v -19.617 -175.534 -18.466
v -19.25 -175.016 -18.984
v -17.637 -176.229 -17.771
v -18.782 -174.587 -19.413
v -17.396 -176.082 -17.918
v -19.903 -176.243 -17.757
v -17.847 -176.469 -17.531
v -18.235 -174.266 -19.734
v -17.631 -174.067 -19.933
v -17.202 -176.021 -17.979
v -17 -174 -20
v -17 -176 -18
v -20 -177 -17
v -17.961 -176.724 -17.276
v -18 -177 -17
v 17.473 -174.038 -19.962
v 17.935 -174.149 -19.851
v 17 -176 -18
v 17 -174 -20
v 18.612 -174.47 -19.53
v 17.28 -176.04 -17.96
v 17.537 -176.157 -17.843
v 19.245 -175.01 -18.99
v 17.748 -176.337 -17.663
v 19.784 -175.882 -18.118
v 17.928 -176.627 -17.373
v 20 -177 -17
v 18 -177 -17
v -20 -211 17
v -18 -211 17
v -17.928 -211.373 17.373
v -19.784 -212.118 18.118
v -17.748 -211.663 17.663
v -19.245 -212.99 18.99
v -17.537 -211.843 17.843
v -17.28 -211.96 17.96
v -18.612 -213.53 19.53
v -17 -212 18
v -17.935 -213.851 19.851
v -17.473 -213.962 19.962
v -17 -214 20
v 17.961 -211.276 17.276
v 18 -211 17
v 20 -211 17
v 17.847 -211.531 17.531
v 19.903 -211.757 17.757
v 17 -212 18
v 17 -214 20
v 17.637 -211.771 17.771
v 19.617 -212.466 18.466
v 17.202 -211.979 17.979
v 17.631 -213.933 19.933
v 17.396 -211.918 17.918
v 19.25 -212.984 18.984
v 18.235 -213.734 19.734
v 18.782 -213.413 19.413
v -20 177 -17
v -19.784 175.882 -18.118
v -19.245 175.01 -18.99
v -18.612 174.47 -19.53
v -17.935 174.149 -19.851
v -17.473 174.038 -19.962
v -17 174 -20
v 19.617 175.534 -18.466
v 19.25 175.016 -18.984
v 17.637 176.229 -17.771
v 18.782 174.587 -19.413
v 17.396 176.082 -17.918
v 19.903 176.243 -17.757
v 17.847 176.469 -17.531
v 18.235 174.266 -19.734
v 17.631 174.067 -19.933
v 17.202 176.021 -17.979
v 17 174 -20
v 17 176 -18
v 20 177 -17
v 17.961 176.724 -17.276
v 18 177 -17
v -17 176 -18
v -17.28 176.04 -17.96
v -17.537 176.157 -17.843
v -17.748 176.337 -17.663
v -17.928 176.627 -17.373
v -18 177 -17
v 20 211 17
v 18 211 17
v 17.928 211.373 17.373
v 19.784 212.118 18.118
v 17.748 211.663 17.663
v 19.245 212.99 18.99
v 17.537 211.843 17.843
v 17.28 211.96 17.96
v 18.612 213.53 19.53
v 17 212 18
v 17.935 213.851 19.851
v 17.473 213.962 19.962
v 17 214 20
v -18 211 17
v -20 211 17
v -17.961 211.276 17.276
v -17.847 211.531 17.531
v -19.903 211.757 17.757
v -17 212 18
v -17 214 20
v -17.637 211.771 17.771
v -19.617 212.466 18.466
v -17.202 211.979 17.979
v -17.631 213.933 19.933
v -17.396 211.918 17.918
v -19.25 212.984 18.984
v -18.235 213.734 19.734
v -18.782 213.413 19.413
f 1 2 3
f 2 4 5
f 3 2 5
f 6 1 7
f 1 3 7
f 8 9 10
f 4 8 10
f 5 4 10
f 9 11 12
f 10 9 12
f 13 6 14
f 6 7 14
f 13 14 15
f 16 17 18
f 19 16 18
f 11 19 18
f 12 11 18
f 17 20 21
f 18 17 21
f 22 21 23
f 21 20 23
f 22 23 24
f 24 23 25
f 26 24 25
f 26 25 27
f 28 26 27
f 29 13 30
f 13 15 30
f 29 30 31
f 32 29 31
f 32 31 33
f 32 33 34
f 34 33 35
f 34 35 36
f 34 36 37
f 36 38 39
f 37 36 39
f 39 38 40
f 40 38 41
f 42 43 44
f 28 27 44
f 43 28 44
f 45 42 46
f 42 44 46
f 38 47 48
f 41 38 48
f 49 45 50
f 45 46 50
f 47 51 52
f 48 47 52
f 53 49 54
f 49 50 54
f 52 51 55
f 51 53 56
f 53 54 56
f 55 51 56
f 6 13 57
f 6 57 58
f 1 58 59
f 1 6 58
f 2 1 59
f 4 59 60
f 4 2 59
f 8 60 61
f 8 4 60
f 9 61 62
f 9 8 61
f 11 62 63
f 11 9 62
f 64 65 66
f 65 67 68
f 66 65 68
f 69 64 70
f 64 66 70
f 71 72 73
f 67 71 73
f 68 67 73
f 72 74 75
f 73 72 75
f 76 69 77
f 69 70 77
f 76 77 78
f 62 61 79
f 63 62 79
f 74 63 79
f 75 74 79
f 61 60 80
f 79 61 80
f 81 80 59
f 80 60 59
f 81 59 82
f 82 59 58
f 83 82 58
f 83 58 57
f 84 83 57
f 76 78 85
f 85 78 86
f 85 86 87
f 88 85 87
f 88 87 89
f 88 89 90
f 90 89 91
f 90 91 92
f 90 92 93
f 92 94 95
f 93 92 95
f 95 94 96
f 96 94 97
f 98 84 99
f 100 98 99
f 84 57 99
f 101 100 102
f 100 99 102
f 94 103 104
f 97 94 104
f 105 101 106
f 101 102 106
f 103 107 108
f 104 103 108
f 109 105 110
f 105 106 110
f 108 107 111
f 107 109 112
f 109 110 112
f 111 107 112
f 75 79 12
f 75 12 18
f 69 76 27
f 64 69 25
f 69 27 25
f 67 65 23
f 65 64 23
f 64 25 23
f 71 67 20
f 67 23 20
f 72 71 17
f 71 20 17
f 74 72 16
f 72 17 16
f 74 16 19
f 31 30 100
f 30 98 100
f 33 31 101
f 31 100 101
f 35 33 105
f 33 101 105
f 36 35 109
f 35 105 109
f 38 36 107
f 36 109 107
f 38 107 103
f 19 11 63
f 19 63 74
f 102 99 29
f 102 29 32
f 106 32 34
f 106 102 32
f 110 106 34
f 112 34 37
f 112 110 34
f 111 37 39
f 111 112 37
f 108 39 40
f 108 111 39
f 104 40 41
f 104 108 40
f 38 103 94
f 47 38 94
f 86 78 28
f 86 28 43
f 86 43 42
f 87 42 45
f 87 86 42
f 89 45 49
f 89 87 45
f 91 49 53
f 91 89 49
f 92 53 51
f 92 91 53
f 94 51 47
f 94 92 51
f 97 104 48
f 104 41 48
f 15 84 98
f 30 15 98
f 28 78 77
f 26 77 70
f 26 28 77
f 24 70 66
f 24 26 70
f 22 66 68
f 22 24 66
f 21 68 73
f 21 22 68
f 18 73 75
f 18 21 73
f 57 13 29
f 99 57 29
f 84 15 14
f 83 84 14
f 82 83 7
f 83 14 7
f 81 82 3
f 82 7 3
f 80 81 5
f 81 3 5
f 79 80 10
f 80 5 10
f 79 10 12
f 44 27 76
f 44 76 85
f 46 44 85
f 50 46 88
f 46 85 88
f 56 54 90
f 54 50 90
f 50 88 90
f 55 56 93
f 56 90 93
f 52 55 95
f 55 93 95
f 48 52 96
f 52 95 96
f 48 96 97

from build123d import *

# Parameters (mm, degrees)
F2_W     = 40
F2_H     = 40
F3_DEPTH = 214
F4_R     = 3
F5_T     = -2
F7_DEPTH = 40.001
F9_DEPTH = 40.001


with BuildPart() as f3:
    # F2 (on Front) → F3 (new body, symmetric)
    with BuildSketch(Plane.XZ):
        Rectangle(F2_W, F2_H)
    extrude(amount=F3_DEPTH, both=True)

    # F4
    f4_edges = [f3.edges().sort_by_distance(p)[0] for p in [
        (20, 0, 20),
        (-20, 0, 20),
        (20, 0, -20),
        (-20, 0, -20),
    ]]
    fillet(f4_edges, radius=F4_R)

    # F5
    f5_openings = [f3.faces().sort_by_distance(p)[0] for p in [
        (0, -214, 0),
        (0, 214, 0),
    ]]
    offset(amount=F5_T, openings=f5_openings)

    # F6 (on face) → F7 (cut, through all)
    with BuildSketch(Plane(origin=(-20, 0, 0), x_dir=(0, -1, 0), z_dir=(-1, 0, 0))):
        Polygon((-214, 20), (-214, -20), (-174, -20), align=None)
    extrude(amount=-F7_DEPTH, mode=Mode.SUBTRACT)

    # F8 (on face) → F9 (cut, through all)
    with BuildSketch(Plane.YZ.offset(20)):
        Polygon((-214, -20), (-174, -20), (-214, 20), align=None)
    extrude(amount=-F9_DEPTH, mode=Mode.SUBTRACT)


solid = f3.part
